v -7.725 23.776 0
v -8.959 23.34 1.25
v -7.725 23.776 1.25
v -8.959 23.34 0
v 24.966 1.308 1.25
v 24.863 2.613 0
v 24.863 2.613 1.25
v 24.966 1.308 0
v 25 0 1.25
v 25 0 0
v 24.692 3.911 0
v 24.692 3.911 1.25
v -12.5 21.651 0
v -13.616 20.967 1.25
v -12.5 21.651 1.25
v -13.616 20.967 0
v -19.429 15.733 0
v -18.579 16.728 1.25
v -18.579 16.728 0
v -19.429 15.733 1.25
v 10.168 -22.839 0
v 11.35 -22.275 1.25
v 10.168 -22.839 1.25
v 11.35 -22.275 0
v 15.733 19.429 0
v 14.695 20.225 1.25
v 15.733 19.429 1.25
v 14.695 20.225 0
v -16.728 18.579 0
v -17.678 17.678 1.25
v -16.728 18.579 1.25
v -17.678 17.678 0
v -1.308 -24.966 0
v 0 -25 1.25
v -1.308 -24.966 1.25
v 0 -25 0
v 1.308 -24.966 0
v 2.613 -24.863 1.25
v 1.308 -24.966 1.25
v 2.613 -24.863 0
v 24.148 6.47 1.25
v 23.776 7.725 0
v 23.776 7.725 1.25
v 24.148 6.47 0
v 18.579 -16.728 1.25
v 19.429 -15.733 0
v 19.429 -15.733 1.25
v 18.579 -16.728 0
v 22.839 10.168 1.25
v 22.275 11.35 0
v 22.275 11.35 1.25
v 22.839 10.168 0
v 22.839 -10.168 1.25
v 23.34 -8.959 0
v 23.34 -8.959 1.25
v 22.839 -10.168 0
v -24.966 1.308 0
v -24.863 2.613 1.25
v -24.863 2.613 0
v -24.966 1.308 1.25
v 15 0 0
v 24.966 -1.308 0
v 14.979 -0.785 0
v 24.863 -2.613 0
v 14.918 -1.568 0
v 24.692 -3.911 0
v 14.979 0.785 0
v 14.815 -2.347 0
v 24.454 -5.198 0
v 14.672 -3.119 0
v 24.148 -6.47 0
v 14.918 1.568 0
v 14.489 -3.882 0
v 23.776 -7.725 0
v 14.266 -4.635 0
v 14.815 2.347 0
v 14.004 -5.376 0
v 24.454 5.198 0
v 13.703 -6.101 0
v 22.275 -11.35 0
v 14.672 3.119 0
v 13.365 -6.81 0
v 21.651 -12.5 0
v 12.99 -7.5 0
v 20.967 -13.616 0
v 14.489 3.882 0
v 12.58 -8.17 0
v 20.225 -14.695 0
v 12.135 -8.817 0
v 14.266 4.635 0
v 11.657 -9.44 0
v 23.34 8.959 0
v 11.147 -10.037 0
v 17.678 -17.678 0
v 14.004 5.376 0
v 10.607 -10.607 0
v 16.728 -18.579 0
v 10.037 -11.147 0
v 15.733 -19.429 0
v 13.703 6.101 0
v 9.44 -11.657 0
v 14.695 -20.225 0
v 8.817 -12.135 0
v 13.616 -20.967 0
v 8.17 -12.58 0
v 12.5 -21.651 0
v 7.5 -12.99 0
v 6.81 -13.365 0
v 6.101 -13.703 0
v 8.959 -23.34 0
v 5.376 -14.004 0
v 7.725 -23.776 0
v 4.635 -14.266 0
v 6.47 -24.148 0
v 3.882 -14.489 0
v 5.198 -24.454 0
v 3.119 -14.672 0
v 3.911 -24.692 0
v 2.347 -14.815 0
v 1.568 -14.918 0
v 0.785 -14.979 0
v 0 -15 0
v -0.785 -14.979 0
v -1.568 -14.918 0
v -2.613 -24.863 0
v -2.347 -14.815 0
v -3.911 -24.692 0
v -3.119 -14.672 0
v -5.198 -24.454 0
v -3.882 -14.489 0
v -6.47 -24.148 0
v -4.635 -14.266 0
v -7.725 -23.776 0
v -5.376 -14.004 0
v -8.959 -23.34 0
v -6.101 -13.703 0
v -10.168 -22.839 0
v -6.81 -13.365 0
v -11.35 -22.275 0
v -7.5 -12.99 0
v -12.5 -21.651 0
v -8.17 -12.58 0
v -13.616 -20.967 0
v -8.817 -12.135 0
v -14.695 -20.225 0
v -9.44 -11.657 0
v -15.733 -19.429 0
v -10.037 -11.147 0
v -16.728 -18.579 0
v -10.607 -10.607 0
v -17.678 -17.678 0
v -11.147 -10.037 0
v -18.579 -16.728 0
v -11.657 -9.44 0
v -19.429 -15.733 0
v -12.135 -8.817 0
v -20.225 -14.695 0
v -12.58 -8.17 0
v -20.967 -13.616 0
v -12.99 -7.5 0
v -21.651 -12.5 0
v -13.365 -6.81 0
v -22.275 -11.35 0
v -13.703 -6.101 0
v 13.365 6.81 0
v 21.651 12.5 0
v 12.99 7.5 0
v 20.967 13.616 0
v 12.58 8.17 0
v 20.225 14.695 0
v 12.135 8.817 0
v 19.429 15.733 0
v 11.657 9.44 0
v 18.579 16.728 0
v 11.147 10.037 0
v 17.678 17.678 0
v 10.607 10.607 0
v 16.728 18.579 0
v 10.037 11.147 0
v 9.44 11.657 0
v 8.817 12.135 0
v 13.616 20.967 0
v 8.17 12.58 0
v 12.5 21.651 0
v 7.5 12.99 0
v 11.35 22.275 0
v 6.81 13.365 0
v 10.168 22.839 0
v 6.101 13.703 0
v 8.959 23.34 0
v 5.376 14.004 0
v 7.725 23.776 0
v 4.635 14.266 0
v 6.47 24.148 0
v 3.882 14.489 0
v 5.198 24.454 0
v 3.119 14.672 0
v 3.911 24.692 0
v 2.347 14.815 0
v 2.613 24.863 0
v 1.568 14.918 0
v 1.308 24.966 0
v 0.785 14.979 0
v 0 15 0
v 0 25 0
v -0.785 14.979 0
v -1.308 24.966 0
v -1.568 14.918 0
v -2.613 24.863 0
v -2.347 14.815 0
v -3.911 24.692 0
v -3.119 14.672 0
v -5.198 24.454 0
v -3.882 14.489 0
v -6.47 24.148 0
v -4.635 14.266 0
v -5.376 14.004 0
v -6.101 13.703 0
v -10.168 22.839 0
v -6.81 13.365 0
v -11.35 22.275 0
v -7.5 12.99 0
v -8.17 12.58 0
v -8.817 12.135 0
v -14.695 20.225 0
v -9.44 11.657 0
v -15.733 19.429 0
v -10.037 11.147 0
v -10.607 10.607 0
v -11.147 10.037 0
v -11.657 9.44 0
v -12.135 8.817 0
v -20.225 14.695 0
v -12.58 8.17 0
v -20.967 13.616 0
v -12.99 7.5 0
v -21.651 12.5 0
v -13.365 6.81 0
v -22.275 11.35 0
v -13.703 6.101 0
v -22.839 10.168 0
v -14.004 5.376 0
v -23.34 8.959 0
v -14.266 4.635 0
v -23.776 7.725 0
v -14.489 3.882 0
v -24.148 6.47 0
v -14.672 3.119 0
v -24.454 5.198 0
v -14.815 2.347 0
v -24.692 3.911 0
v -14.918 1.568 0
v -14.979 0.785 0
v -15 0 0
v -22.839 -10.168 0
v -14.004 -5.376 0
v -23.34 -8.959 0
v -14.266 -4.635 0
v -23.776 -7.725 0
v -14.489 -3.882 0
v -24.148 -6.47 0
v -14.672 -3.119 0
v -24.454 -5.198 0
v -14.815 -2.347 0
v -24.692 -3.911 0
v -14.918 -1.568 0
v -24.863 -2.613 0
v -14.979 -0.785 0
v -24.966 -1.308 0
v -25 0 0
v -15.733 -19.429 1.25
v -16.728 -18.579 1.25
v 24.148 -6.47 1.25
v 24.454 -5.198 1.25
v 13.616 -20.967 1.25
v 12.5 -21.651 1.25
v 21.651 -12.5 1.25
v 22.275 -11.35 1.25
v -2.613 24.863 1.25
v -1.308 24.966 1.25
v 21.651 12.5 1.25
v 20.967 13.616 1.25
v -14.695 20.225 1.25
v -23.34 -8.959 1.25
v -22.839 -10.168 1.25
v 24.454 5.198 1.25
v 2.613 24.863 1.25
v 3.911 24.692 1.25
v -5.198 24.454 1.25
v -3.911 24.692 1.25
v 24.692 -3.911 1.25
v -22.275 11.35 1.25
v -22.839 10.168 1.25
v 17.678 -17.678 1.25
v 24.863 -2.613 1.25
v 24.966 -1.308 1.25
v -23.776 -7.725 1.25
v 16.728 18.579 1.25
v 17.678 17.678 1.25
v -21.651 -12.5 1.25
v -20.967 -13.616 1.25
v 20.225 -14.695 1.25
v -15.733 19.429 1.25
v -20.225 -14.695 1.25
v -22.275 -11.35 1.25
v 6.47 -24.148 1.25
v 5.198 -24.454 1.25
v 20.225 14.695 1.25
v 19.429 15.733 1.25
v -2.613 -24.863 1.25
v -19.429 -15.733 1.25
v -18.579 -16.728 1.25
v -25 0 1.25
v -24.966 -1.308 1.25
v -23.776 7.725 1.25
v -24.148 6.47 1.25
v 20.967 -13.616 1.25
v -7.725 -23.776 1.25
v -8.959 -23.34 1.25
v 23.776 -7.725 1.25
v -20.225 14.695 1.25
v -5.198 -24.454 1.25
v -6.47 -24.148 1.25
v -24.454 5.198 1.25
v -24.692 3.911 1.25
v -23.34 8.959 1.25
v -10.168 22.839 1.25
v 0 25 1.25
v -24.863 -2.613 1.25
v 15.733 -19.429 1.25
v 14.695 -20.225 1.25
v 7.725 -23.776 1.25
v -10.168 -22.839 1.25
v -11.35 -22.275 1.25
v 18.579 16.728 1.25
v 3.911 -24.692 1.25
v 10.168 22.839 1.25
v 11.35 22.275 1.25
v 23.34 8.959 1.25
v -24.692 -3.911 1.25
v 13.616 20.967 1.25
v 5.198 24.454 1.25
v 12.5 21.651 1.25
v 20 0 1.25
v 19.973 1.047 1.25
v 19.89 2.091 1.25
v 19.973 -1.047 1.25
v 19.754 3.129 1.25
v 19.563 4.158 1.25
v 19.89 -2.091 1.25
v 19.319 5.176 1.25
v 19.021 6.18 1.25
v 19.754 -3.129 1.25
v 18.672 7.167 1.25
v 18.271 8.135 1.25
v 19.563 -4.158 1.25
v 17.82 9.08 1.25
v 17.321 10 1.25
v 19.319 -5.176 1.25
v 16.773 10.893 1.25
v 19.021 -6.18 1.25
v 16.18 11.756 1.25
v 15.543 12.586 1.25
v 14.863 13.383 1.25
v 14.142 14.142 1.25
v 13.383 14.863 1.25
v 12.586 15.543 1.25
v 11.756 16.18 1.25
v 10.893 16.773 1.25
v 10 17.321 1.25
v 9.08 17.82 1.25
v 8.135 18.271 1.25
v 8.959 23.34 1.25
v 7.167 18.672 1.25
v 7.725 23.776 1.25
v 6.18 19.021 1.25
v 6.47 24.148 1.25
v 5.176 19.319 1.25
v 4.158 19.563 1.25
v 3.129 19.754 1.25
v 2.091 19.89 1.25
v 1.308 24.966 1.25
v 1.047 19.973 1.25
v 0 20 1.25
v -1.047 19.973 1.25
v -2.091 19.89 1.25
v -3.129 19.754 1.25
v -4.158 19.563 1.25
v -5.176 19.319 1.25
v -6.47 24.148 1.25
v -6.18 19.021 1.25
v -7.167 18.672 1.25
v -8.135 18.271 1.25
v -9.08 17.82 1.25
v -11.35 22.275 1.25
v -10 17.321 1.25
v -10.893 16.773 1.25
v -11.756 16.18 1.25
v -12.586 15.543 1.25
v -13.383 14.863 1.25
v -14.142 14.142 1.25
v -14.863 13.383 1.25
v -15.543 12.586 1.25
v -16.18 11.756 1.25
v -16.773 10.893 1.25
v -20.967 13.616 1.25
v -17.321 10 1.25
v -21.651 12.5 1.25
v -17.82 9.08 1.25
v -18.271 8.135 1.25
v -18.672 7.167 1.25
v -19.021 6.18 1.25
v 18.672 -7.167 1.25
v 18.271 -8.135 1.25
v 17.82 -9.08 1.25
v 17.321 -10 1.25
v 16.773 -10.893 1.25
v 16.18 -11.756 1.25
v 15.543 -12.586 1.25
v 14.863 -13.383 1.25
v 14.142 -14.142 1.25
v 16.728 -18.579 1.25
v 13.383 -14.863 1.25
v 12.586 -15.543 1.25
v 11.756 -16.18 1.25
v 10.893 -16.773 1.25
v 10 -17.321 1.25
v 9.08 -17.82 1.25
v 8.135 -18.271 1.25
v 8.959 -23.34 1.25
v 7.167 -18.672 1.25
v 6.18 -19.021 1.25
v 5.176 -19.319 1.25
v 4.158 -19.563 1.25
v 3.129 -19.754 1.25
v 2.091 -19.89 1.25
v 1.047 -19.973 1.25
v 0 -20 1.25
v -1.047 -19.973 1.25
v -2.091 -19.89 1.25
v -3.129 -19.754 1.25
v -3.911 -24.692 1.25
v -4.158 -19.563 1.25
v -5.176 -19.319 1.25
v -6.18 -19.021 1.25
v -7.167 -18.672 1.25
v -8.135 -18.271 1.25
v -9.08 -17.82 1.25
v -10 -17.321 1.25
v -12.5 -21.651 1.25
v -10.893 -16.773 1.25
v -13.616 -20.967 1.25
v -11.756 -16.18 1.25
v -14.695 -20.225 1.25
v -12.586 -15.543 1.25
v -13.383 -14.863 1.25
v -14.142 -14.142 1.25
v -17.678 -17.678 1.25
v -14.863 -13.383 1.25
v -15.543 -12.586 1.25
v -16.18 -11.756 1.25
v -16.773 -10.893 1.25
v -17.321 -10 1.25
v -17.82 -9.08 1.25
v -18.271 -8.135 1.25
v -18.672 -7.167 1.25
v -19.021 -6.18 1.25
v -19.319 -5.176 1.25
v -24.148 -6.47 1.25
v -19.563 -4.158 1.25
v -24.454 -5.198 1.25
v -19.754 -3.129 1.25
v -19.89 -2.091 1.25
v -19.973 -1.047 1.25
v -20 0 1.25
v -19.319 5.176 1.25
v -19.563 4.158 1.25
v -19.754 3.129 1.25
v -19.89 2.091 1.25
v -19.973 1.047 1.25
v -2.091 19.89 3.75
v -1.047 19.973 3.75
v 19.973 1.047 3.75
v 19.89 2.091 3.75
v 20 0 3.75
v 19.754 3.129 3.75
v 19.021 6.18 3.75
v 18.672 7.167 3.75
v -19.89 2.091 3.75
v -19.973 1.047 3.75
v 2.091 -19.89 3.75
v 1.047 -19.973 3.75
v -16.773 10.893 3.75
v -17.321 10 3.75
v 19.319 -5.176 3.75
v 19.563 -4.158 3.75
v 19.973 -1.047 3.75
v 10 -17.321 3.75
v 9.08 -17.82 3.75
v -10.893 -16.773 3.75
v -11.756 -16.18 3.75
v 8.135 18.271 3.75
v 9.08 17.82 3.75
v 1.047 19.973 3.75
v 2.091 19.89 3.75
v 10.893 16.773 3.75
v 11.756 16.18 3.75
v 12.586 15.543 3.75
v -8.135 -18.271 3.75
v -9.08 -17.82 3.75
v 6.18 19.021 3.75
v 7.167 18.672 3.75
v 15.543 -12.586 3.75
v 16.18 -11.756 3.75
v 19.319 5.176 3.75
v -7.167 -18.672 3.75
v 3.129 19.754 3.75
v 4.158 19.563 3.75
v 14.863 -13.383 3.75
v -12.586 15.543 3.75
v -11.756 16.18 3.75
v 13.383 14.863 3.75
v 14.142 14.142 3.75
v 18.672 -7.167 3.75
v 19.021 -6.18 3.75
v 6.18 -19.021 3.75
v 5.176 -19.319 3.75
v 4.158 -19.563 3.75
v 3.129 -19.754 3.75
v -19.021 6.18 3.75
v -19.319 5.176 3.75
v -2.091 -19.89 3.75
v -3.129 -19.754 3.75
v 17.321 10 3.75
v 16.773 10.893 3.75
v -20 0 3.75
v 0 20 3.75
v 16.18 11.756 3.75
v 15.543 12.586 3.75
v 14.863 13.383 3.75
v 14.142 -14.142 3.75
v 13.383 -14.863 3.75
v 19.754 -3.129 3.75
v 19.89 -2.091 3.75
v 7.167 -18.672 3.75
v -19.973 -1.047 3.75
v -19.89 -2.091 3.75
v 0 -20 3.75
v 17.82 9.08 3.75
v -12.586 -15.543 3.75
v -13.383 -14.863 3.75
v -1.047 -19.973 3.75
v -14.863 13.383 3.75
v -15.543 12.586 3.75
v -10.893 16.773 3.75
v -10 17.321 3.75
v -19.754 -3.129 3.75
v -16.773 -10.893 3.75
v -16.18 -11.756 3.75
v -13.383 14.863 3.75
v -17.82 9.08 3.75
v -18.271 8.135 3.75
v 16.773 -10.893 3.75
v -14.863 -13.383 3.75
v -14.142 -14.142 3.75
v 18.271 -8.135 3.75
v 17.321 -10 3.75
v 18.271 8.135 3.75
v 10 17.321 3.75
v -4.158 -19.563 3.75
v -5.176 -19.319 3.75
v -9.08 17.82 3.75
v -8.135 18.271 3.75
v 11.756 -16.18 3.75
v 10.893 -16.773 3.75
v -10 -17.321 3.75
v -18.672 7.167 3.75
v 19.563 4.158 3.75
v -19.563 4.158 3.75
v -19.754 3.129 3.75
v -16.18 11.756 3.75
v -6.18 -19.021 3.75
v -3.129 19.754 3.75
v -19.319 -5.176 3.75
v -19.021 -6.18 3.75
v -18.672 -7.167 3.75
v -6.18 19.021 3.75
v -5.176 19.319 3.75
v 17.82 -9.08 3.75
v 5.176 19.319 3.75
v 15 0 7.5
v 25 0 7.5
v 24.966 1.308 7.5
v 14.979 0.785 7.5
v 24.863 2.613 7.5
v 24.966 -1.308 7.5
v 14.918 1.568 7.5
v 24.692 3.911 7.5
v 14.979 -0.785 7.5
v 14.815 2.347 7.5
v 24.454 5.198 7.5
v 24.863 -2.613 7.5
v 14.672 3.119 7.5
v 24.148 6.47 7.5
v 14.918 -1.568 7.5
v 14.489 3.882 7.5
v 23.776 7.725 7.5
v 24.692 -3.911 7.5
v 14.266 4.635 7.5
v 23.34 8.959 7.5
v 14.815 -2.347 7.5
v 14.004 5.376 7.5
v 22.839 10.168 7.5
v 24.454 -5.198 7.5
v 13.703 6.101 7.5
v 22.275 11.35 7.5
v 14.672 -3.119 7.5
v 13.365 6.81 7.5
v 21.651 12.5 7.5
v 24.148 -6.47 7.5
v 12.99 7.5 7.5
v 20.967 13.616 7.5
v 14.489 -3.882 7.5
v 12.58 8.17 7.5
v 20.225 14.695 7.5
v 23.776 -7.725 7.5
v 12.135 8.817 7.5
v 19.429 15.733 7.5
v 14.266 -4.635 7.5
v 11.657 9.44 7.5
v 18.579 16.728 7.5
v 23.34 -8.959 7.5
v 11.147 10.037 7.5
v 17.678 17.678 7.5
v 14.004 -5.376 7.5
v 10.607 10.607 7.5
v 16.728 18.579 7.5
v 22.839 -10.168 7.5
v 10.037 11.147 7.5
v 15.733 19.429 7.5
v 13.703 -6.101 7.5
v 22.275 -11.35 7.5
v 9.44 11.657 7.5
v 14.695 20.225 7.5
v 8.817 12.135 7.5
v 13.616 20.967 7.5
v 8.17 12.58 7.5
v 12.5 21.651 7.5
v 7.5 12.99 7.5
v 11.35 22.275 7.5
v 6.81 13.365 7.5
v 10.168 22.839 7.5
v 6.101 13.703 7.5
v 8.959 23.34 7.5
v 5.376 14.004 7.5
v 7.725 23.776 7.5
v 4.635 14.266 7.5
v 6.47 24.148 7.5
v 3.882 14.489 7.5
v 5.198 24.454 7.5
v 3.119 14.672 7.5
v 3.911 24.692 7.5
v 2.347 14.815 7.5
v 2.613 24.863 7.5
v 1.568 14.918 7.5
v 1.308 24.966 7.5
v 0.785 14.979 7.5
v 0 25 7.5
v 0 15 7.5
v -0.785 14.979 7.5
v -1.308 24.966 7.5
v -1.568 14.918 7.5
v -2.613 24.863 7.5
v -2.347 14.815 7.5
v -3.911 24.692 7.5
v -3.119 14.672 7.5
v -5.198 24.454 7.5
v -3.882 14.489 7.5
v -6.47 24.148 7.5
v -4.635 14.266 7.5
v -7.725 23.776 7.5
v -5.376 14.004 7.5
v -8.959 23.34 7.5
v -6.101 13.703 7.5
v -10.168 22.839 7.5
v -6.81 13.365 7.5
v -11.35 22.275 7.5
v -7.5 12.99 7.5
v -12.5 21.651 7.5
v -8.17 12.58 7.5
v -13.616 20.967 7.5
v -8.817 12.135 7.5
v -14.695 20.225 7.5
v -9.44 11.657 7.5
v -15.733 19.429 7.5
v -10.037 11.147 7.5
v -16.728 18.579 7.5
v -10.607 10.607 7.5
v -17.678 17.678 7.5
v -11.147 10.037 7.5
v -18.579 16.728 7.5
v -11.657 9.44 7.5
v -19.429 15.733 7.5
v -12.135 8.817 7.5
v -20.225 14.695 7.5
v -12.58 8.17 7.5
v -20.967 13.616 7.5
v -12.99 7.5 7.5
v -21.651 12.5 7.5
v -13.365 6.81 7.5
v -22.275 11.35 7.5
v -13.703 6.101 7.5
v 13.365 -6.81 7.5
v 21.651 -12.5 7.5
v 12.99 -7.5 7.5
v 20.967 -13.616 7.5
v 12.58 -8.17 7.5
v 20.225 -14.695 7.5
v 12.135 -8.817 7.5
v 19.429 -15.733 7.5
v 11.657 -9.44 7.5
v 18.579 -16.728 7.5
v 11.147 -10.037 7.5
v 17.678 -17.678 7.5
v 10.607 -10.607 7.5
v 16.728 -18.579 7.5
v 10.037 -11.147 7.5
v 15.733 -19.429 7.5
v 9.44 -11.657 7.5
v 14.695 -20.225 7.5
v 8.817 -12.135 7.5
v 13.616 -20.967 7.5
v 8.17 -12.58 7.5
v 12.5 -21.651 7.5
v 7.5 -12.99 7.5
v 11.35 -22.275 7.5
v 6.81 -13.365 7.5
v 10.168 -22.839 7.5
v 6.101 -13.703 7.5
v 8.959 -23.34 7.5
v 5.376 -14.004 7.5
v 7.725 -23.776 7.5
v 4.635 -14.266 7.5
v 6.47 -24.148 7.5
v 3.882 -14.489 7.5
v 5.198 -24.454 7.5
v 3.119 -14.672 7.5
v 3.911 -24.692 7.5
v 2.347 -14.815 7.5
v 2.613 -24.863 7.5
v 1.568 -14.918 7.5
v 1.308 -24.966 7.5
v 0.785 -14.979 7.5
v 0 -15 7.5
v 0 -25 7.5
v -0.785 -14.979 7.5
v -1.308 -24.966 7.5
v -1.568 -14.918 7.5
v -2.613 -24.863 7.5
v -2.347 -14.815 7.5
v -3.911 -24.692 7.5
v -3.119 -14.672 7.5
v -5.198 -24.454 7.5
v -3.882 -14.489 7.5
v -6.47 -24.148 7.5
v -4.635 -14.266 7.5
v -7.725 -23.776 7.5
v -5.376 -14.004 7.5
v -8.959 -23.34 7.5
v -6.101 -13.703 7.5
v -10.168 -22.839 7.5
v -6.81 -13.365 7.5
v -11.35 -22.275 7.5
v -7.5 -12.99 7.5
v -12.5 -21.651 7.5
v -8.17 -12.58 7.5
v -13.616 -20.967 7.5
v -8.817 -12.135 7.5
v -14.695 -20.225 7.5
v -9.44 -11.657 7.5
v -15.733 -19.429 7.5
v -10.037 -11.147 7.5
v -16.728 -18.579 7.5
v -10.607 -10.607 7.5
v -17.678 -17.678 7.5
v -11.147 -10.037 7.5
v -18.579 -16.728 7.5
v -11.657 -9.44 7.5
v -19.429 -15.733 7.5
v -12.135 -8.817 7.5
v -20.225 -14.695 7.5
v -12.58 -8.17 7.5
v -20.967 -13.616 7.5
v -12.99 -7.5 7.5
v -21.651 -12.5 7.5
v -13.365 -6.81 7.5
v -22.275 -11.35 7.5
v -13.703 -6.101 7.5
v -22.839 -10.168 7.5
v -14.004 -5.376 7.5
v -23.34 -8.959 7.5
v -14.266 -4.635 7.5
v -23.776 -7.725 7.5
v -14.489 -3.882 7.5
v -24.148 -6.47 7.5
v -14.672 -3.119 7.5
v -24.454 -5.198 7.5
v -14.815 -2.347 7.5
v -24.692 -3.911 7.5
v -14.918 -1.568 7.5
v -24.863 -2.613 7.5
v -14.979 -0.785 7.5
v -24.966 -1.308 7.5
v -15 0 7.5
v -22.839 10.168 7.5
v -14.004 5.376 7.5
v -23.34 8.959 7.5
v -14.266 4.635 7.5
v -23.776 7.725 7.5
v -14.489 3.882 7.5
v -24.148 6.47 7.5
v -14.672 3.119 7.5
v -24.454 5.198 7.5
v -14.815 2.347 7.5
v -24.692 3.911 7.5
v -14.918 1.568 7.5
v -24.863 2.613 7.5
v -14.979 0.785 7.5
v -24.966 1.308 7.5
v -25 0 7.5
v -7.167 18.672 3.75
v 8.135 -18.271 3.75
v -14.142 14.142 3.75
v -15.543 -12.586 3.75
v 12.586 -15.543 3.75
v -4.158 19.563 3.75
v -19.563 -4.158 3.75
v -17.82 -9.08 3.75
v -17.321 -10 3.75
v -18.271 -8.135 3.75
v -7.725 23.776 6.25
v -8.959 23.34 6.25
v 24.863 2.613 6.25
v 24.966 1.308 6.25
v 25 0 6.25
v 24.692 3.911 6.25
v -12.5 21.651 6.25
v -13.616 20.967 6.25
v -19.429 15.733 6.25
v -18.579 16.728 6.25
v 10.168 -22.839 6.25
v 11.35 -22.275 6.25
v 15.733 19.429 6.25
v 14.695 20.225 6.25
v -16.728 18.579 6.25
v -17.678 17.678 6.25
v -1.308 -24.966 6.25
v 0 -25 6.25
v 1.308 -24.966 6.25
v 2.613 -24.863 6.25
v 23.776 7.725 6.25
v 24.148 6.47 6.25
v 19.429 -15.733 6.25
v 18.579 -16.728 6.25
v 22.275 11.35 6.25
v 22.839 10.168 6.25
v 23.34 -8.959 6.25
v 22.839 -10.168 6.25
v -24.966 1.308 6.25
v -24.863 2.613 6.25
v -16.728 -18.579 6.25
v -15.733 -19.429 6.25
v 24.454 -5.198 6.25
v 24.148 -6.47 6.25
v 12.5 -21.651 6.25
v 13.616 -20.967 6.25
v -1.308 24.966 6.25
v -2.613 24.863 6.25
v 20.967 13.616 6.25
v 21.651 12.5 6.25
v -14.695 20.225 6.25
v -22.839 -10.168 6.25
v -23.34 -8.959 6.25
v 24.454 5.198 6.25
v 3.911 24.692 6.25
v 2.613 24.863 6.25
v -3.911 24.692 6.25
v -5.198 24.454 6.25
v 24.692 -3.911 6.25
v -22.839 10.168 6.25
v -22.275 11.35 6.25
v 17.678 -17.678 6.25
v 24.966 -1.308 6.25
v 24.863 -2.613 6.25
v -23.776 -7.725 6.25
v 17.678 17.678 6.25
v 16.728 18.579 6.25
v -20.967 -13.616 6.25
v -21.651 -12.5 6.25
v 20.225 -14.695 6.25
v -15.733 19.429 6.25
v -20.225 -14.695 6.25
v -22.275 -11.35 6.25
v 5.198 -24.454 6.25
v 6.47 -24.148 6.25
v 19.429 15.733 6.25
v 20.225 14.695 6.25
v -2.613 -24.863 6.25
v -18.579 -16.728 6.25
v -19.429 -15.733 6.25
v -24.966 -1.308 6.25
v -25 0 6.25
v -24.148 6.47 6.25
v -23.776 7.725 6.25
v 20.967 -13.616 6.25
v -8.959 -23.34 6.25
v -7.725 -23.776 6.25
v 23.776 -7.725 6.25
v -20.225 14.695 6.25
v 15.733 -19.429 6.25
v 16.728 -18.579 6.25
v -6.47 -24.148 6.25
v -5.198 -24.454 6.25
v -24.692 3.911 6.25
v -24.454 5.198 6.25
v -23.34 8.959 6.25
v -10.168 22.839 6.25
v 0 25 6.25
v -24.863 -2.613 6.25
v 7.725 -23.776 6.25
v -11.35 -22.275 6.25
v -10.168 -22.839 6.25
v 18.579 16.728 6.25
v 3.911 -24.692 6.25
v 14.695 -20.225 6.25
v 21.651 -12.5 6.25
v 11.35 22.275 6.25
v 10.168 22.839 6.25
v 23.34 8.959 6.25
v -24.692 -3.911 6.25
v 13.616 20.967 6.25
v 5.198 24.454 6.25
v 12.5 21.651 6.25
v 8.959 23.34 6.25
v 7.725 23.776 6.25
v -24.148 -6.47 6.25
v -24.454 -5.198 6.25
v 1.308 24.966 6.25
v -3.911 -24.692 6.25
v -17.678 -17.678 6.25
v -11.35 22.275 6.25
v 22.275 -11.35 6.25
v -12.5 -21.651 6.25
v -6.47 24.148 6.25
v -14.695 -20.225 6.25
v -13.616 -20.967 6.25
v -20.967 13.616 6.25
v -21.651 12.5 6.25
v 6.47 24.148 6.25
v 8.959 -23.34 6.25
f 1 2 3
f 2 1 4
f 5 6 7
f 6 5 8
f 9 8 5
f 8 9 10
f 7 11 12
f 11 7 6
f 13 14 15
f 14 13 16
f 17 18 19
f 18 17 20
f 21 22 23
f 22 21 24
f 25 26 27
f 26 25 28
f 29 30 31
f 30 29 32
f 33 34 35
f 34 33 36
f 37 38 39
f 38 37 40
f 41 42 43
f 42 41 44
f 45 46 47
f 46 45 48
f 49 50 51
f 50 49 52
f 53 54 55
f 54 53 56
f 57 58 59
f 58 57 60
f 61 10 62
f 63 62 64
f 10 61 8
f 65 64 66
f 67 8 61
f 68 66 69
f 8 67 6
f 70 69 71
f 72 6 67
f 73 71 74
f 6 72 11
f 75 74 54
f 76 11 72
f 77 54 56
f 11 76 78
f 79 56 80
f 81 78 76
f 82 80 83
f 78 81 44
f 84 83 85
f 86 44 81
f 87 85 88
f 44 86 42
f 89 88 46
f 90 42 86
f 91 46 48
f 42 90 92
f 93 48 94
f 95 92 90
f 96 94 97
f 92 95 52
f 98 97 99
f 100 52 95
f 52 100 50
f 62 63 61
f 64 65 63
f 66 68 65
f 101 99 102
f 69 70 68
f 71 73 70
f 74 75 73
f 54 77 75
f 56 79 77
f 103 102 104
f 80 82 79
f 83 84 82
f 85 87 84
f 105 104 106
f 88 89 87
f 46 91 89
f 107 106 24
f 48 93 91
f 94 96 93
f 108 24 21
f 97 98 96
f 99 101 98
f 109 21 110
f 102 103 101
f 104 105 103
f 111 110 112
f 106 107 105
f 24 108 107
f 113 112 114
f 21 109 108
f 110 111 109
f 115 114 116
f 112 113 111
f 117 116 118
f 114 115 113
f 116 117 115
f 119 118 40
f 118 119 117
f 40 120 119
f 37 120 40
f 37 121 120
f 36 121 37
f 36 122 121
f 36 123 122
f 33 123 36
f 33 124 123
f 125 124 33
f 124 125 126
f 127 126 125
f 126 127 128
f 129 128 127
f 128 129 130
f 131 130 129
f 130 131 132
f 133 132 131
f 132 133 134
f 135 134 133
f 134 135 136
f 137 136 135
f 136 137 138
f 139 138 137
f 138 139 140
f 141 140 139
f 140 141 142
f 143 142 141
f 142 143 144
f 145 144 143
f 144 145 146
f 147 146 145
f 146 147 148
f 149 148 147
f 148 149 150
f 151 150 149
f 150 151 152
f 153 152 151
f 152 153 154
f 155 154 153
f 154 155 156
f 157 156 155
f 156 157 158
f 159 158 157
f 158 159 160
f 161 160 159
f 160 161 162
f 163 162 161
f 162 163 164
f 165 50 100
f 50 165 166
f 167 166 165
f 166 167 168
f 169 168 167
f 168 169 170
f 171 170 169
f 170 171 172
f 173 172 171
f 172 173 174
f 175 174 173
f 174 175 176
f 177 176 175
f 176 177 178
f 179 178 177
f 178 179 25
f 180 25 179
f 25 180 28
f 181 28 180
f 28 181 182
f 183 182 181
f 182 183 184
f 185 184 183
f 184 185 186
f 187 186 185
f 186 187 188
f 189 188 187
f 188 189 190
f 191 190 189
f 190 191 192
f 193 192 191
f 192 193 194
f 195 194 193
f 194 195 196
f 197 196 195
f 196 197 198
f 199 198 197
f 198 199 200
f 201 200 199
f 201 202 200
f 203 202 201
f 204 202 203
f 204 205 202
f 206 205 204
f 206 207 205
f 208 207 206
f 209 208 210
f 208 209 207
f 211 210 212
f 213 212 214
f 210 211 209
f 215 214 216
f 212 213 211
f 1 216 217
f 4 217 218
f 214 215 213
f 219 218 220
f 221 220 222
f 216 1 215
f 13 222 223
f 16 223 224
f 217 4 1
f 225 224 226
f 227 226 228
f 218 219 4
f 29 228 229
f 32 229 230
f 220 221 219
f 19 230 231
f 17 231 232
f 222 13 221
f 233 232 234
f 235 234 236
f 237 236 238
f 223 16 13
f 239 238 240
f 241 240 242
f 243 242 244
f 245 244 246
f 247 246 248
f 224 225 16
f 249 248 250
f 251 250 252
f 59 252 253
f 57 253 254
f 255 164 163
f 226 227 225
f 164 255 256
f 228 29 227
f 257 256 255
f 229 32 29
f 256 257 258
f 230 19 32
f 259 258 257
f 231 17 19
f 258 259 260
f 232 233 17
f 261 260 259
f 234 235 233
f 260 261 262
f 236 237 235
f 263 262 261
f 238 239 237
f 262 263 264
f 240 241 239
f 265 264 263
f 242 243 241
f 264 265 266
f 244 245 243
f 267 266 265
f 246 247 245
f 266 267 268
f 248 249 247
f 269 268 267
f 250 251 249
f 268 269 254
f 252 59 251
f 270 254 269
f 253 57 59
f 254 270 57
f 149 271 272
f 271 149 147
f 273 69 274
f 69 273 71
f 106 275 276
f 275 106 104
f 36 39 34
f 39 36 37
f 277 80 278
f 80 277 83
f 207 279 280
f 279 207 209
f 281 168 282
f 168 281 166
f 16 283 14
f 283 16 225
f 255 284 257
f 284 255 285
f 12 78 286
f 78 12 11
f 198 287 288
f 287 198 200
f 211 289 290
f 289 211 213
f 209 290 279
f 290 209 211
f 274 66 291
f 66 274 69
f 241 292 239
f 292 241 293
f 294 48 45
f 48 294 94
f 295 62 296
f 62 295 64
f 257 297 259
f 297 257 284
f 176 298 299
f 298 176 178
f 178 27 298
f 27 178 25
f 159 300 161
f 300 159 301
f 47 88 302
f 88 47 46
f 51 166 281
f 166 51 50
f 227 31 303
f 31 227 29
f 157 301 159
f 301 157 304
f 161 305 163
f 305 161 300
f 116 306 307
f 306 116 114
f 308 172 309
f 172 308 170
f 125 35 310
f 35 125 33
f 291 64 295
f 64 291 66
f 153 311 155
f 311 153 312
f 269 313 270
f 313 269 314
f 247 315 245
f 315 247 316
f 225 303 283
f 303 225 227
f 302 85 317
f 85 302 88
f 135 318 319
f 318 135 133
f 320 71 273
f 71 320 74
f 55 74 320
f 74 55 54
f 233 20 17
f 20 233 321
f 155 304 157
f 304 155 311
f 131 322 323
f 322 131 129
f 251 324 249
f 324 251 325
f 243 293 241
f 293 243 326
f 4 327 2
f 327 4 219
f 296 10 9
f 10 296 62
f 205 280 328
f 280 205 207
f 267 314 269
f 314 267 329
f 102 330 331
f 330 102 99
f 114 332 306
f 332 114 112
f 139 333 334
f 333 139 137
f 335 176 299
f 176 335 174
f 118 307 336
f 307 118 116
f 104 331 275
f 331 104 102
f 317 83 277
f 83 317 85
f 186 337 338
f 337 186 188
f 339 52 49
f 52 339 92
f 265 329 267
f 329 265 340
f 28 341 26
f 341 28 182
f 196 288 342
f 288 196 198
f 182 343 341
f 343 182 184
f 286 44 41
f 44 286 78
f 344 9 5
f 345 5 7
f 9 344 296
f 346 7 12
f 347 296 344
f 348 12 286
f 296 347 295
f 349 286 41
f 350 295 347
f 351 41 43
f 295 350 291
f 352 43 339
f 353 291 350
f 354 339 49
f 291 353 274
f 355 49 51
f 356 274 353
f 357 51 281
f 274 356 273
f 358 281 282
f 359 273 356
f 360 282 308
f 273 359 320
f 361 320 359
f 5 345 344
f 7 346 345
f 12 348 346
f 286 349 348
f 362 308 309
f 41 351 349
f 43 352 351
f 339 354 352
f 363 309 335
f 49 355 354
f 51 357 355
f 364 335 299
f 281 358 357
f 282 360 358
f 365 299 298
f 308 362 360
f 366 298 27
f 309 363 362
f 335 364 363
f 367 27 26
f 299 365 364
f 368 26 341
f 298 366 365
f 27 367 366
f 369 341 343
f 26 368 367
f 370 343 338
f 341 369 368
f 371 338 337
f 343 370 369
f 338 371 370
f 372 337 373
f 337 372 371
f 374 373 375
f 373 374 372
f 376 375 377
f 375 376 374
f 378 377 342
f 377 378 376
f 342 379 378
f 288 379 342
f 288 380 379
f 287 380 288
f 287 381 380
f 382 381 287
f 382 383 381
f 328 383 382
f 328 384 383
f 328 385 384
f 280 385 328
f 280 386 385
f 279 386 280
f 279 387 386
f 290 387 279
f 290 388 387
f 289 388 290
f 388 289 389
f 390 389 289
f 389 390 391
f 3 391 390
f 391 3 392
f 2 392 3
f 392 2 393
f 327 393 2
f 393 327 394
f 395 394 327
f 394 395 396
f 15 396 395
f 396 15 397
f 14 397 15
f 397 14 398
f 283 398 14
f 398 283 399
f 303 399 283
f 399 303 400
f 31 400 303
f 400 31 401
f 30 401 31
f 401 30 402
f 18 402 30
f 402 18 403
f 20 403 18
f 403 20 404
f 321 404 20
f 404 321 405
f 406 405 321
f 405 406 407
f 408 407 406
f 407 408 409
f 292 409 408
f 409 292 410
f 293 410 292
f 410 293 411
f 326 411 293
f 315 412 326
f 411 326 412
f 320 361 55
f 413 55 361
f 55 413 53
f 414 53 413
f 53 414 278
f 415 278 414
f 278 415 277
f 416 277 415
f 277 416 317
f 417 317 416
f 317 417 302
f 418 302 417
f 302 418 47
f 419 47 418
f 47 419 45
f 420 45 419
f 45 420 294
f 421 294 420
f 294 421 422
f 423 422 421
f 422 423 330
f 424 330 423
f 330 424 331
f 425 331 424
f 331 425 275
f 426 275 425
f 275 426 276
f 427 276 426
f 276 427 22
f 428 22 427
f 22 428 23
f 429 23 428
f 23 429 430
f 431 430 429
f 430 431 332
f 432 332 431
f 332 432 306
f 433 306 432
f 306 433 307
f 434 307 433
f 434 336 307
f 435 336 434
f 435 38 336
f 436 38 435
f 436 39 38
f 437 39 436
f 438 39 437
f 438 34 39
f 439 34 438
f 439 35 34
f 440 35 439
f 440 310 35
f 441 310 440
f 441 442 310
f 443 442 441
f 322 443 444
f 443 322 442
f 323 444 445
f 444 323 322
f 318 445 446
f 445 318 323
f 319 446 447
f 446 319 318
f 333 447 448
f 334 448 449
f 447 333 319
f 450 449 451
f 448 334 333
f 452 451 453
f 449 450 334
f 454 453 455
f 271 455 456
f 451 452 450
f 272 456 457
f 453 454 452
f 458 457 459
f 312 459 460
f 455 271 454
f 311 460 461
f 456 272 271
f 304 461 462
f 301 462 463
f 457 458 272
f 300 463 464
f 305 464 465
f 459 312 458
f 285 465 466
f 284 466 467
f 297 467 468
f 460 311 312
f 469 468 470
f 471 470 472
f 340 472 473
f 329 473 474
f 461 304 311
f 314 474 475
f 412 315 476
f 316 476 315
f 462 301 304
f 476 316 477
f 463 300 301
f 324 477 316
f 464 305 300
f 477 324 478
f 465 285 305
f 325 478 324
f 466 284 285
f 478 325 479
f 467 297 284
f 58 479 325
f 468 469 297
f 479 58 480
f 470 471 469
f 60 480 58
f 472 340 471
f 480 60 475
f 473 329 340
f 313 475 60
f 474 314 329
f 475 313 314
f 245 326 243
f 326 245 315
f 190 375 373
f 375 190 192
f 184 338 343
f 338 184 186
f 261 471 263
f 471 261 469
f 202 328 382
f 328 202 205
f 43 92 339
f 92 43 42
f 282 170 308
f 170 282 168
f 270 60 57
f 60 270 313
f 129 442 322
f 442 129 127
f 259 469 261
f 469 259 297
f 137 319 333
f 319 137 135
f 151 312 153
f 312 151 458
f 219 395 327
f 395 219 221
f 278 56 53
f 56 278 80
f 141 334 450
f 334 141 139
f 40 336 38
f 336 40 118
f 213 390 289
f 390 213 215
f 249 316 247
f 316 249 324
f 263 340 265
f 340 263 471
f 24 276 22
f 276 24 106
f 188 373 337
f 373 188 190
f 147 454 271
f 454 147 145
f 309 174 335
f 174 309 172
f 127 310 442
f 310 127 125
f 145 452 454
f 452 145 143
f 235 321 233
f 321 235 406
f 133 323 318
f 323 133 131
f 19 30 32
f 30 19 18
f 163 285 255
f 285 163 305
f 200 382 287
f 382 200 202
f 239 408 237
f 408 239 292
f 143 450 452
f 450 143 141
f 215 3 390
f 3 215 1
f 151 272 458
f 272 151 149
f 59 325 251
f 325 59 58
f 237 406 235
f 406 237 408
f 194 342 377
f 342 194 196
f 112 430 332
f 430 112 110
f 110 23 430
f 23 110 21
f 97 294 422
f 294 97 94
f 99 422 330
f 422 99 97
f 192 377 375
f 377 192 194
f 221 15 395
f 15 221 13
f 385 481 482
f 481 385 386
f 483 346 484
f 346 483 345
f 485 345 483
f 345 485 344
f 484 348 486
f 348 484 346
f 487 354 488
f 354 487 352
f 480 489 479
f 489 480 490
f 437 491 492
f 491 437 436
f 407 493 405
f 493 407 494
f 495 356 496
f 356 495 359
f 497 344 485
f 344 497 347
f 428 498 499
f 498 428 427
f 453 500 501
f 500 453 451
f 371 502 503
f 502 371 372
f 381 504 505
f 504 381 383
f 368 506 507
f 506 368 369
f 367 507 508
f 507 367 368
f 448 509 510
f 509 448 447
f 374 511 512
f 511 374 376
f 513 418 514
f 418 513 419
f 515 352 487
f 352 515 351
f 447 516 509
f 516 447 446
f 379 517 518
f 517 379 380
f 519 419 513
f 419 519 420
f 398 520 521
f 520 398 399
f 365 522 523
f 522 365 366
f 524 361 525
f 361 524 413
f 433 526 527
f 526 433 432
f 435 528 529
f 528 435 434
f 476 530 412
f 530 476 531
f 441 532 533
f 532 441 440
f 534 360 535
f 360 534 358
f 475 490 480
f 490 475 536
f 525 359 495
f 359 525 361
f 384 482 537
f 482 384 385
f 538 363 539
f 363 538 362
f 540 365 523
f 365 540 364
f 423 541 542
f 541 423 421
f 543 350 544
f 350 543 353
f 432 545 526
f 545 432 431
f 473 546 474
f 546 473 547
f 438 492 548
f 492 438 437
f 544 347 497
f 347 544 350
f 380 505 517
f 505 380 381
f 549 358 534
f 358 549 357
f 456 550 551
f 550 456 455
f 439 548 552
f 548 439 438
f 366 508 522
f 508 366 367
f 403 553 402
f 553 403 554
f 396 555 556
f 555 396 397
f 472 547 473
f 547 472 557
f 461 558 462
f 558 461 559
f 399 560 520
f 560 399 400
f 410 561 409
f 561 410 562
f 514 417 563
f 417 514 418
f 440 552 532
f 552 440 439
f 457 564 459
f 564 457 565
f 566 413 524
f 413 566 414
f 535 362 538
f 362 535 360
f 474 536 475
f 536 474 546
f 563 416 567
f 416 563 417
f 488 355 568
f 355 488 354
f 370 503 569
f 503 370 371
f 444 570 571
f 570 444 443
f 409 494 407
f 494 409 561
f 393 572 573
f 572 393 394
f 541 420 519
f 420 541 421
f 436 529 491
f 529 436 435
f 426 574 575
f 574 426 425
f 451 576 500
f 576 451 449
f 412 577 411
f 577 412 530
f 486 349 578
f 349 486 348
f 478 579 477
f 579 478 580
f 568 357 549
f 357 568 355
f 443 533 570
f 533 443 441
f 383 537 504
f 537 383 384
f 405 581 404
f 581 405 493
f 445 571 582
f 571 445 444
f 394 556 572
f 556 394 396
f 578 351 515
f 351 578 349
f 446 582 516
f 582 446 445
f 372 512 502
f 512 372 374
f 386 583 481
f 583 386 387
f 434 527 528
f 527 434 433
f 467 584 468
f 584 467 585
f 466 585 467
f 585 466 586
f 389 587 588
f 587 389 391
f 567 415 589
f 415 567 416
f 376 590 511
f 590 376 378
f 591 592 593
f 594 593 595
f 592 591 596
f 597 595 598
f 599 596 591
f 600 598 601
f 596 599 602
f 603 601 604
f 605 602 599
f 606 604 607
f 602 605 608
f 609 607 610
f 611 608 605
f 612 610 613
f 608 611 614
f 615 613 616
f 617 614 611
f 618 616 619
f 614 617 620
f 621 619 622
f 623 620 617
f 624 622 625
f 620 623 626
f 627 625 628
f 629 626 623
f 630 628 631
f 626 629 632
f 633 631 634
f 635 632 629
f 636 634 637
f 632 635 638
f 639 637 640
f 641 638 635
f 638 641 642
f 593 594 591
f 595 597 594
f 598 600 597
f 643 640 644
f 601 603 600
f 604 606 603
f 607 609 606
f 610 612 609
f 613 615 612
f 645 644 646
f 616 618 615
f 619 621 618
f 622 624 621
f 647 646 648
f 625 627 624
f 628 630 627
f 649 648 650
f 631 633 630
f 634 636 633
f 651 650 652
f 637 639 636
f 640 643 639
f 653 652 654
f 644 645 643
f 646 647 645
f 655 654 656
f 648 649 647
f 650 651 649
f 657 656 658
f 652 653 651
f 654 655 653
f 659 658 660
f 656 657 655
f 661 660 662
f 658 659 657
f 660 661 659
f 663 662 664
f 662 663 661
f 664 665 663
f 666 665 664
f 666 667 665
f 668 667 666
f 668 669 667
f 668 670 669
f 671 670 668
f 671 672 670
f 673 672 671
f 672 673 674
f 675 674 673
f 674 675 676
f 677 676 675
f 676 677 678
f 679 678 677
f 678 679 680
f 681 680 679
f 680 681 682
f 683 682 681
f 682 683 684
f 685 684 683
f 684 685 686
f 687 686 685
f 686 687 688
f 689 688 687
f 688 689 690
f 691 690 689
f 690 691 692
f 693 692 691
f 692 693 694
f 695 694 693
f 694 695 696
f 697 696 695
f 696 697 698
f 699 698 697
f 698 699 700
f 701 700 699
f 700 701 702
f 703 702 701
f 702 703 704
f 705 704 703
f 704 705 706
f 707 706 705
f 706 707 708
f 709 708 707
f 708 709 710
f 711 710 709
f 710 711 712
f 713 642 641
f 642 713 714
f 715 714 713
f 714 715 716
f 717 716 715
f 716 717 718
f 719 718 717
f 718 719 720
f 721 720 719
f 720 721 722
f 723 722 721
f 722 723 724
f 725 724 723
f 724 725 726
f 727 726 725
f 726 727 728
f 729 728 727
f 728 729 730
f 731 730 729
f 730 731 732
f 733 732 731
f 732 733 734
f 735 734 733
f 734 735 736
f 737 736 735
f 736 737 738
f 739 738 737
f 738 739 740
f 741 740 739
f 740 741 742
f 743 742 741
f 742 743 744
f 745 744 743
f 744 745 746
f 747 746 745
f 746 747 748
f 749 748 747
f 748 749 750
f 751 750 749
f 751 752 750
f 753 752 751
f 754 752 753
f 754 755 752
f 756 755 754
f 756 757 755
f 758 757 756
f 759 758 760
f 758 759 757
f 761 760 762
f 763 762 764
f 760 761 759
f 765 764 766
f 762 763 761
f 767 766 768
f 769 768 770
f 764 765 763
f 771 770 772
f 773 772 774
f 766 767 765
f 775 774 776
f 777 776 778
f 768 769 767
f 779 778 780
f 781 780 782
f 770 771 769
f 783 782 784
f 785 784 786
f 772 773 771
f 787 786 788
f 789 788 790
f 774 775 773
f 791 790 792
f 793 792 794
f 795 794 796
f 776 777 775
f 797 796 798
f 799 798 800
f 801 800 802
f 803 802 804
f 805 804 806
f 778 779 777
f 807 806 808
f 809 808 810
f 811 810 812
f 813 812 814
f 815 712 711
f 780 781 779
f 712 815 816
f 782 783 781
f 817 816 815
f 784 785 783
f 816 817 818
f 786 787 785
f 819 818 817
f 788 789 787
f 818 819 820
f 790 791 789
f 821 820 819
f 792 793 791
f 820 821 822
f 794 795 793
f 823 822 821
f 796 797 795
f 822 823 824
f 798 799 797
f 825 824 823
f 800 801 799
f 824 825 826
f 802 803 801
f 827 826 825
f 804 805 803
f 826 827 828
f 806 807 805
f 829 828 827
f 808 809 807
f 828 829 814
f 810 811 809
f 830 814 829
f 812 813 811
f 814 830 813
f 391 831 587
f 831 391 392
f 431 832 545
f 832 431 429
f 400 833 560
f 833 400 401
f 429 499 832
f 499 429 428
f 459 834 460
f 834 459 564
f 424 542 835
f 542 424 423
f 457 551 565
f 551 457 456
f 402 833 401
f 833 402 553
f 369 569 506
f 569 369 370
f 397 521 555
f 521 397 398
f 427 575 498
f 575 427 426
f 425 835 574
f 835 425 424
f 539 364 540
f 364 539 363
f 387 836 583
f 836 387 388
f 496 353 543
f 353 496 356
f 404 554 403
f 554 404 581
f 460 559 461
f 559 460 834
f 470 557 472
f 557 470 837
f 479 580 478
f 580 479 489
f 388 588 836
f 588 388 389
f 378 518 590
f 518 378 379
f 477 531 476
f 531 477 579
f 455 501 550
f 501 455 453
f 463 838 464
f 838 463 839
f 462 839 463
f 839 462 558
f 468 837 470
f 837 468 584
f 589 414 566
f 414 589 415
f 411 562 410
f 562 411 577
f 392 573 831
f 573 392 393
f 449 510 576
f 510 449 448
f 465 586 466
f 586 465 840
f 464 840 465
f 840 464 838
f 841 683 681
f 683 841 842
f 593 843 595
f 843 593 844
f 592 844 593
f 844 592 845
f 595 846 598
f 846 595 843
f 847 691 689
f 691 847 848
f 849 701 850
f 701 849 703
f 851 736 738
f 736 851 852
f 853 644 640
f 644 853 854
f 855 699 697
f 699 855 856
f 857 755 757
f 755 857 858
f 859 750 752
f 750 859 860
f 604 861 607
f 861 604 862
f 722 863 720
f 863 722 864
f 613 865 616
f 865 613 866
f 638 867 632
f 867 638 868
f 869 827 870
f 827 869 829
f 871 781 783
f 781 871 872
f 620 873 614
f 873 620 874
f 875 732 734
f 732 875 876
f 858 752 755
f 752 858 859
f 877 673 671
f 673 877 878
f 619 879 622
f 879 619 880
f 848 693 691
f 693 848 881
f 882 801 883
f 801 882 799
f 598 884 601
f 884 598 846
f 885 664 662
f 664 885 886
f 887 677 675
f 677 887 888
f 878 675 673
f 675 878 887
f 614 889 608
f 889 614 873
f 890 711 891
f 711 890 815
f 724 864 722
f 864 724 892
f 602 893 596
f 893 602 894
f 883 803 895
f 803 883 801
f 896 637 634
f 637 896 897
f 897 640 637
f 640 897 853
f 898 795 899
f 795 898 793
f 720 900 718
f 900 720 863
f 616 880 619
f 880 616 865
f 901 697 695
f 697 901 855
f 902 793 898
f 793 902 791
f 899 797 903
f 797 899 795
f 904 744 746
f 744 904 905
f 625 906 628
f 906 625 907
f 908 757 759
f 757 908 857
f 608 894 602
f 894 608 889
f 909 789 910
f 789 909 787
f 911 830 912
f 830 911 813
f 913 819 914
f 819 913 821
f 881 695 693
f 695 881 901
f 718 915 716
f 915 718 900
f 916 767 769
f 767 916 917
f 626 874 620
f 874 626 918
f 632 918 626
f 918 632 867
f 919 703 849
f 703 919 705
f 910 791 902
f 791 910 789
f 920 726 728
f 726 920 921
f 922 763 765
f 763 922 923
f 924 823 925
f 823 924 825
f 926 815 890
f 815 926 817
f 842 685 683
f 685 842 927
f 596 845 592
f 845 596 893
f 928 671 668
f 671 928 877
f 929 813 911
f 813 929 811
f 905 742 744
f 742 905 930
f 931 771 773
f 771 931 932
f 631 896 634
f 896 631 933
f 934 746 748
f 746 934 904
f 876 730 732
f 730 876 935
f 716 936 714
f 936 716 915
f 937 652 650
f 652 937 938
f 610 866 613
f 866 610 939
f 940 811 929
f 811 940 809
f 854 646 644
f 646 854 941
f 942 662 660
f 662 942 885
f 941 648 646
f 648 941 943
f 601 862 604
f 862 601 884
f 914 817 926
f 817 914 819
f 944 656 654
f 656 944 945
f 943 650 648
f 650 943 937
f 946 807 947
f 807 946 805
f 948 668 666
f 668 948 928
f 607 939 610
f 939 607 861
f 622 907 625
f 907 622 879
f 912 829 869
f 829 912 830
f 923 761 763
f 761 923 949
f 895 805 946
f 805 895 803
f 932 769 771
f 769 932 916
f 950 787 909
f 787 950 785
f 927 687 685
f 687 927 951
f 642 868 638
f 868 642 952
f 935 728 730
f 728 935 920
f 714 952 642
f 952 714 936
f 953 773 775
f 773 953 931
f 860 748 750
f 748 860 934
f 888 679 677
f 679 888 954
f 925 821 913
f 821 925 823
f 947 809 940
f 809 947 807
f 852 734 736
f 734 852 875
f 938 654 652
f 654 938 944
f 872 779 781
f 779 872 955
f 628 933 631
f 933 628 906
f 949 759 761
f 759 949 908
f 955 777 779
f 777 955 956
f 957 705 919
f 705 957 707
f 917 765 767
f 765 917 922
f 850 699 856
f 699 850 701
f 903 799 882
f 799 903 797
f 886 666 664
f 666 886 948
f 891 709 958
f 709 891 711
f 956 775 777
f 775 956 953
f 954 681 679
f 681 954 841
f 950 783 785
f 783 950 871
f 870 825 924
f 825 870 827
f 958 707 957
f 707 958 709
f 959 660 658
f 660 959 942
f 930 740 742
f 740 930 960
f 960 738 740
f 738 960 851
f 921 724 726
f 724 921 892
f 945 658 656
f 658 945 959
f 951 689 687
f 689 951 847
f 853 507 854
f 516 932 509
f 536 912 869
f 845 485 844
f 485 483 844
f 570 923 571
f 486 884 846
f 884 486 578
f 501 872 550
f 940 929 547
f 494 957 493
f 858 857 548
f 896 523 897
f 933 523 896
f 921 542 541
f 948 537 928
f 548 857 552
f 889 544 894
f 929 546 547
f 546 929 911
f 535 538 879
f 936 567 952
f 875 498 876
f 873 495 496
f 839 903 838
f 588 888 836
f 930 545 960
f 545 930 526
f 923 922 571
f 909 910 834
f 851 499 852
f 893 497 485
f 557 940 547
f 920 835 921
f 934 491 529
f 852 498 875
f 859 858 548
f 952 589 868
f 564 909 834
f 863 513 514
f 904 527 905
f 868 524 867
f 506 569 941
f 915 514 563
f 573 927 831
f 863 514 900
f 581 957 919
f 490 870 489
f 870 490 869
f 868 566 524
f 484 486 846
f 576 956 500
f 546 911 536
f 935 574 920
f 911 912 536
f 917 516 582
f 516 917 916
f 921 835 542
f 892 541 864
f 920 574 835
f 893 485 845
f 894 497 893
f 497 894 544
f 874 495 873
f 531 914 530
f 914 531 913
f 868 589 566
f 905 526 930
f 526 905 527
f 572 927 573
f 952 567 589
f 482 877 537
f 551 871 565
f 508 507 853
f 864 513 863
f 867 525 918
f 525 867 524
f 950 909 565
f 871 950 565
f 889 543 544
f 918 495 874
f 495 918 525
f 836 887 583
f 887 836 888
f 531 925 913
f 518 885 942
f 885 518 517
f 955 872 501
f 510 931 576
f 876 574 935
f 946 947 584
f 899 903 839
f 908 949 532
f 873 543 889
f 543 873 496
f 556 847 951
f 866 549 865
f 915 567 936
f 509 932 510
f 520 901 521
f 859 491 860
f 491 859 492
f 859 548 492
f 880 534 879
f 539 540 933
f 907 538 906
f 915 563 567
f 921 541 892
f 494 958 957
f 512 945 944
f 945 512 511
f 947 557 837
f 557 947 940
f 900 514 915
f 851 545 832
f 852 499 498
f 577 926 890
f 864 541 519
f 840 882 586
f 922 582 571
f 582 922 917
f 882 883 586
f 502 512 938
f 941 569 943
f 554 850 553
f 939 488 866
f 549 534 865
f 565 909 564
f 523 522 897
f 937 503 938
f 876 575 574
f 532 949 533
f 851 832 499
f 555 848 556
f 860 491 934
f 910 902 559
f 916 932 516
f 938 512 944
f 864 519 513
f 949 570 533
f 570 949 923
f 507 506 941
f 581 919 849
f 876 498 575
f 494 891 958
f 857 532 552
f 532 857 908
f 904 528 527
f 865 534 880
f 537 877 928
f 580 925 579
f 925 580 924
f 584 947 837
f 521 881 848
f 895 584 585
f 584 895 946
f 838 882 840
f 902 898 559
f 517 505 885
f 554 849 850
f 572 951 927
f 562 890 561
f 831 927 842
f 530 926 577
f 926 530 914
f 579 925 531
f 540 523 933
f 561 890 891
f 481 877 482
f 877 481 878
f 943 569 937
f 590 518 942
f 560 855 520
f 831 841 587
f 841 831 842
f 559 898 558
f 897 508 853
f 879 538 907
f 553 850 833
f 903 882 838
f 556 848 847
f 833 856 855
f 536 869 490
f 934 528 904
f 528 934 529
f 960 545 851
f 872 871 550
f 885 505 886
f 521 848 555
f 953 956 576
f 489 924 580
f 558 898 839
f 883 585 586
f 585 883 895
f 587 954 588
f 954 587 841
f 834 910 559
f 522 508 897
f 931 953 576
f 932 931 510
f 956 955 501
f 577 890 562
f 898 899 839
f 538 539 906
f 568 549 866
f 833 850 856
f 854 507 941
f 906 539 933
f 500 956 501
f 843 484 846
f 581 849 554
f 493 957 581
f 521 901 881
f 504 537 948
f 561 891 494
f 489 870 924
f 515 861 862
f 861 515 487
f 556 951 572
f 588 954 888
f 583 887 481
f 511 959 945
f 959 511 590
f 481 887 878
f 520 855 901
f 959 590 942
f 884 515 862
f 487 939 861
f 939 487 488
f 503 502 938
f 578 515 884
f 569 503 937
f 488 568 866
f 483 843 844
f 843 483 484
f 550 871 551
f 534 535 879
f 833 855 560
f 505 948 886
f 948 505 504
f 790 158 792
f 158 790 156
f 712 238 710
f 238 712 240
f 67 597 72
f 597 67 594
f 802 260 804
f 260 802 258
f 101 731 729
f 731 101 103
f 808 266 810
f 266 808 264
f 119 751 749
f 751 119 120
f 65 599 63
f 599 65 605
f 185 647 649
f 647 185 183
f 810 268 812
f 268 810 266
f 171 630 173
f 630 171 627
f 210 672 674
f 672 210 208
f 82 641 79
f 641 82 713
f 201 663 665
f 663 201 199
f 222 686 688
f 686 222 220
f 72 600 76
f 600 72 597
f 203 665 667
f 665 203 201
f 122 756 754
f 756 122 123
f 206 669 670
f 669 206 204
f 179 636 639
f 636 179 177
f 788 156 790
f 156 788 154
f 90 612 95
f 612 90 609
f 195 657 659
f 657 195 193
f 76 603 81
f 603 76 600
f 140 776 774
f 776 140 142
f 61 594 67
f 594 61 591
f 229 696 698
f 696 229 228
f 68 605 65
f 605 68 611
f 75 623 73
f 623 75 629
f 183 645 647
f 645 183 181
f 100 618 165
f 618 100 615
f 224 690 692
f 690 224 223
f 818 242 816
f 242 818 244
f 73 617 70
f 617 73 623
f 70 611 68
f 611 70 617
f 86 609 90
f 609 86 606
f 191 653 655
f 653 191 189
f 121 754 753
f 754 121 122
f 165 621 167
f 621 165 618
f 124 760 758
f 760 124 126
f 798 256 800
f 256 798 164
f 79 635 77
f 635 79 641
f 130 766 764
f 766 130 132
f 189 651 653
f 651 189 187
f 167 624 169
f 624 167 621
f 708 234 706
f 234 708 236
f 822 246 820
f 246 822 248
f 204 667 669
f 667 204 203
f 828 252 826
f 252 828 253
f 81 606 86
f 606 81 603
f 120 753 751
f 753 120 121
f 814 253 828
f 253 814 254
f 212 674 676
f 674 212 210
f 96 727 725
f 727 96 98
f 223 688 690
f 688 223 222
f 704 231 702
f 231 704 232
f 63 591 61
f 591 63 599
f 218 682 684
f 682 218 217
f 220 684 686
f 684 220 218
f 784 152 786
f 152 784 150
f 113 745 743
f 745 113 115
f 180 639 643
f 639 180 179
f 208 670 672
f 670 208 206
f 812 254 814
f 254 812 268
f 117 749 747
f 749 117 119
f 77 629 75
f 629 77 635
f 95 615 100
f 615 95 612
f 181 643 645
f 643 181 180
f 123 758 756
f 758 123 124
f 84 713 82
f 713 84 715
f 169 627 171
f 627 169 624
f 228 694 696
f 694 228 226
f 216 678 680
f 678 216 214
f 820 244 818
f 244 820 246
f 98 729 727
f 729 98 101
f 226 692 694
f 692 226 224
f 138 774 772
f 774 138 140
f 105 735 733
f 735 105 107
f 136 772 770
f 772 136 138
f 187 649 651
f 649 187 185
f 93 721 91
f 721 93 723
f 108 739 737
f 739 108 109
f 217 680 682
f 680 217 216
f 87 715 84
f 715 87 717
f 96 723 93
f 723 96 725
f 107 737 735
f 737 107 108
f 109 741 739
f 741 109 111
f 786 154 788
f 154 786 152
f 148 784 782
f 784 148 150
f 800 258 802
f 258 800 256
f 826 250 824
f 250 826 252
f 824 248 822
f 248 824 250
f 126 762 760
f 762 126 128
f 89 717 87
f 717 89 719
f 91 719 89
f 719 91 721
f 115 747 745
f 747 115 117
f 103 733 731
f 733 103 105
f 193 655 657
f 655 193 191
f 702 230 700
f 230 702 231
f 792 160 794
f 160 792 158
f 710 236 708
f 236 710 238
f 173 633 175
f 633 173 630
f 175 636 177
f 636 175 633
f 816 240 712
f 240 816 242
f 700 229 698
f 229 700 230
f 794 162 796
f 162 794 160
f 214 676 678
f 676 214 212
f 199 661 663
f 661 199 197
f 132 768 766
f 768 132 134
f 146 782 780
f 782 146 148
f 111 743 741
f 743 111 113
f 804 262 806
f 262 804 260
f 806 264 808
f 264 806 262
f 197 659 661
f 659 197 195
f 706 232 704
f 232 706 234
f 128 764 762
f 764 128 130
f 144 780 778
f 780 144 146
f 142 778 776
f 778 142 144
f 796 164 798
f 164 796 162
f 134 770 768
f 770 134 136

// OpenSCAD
//variables (mm)
	idlerID = 30; //Inner Dia
	idlerOD = 40; //Outer Dia
	beltwidth= 2.5; //Belt Width
	$fn=120; //faceting

//these are the lips that hold the belt on
	lipheight = 5; //Lip Height
	lipthickness = 1.25; //Lip Thickness
	topangle = 60; //The angle the top lip overhang makes. You can increase this to lower the idler profile.

//construction
	difference(){
	union(){
		cylinder(r=lipheight+idlerOD/2, h=lipthickness);
		cylinder(r=idlerOD/2, h = lipthickness*2+beltwidth+lipheight*cos(topangle));
		translate([0,0,lipthickness+beltwidth+lipheight*cos(topangle)])cylinder(r=lipheight+idlerOD/2, h=lipthickness);
		translate([0,0,beltwidth+lipthickness])cylinder(r1=idlerOD/2, r2=lipheight+idlerOD/2, h=lipheight*cos(topangle));
		}
		translate([0,0,-1])cylinder(r=idlerID/2, h=lipthickness*2+beltwidth+lipheight*2);
}
